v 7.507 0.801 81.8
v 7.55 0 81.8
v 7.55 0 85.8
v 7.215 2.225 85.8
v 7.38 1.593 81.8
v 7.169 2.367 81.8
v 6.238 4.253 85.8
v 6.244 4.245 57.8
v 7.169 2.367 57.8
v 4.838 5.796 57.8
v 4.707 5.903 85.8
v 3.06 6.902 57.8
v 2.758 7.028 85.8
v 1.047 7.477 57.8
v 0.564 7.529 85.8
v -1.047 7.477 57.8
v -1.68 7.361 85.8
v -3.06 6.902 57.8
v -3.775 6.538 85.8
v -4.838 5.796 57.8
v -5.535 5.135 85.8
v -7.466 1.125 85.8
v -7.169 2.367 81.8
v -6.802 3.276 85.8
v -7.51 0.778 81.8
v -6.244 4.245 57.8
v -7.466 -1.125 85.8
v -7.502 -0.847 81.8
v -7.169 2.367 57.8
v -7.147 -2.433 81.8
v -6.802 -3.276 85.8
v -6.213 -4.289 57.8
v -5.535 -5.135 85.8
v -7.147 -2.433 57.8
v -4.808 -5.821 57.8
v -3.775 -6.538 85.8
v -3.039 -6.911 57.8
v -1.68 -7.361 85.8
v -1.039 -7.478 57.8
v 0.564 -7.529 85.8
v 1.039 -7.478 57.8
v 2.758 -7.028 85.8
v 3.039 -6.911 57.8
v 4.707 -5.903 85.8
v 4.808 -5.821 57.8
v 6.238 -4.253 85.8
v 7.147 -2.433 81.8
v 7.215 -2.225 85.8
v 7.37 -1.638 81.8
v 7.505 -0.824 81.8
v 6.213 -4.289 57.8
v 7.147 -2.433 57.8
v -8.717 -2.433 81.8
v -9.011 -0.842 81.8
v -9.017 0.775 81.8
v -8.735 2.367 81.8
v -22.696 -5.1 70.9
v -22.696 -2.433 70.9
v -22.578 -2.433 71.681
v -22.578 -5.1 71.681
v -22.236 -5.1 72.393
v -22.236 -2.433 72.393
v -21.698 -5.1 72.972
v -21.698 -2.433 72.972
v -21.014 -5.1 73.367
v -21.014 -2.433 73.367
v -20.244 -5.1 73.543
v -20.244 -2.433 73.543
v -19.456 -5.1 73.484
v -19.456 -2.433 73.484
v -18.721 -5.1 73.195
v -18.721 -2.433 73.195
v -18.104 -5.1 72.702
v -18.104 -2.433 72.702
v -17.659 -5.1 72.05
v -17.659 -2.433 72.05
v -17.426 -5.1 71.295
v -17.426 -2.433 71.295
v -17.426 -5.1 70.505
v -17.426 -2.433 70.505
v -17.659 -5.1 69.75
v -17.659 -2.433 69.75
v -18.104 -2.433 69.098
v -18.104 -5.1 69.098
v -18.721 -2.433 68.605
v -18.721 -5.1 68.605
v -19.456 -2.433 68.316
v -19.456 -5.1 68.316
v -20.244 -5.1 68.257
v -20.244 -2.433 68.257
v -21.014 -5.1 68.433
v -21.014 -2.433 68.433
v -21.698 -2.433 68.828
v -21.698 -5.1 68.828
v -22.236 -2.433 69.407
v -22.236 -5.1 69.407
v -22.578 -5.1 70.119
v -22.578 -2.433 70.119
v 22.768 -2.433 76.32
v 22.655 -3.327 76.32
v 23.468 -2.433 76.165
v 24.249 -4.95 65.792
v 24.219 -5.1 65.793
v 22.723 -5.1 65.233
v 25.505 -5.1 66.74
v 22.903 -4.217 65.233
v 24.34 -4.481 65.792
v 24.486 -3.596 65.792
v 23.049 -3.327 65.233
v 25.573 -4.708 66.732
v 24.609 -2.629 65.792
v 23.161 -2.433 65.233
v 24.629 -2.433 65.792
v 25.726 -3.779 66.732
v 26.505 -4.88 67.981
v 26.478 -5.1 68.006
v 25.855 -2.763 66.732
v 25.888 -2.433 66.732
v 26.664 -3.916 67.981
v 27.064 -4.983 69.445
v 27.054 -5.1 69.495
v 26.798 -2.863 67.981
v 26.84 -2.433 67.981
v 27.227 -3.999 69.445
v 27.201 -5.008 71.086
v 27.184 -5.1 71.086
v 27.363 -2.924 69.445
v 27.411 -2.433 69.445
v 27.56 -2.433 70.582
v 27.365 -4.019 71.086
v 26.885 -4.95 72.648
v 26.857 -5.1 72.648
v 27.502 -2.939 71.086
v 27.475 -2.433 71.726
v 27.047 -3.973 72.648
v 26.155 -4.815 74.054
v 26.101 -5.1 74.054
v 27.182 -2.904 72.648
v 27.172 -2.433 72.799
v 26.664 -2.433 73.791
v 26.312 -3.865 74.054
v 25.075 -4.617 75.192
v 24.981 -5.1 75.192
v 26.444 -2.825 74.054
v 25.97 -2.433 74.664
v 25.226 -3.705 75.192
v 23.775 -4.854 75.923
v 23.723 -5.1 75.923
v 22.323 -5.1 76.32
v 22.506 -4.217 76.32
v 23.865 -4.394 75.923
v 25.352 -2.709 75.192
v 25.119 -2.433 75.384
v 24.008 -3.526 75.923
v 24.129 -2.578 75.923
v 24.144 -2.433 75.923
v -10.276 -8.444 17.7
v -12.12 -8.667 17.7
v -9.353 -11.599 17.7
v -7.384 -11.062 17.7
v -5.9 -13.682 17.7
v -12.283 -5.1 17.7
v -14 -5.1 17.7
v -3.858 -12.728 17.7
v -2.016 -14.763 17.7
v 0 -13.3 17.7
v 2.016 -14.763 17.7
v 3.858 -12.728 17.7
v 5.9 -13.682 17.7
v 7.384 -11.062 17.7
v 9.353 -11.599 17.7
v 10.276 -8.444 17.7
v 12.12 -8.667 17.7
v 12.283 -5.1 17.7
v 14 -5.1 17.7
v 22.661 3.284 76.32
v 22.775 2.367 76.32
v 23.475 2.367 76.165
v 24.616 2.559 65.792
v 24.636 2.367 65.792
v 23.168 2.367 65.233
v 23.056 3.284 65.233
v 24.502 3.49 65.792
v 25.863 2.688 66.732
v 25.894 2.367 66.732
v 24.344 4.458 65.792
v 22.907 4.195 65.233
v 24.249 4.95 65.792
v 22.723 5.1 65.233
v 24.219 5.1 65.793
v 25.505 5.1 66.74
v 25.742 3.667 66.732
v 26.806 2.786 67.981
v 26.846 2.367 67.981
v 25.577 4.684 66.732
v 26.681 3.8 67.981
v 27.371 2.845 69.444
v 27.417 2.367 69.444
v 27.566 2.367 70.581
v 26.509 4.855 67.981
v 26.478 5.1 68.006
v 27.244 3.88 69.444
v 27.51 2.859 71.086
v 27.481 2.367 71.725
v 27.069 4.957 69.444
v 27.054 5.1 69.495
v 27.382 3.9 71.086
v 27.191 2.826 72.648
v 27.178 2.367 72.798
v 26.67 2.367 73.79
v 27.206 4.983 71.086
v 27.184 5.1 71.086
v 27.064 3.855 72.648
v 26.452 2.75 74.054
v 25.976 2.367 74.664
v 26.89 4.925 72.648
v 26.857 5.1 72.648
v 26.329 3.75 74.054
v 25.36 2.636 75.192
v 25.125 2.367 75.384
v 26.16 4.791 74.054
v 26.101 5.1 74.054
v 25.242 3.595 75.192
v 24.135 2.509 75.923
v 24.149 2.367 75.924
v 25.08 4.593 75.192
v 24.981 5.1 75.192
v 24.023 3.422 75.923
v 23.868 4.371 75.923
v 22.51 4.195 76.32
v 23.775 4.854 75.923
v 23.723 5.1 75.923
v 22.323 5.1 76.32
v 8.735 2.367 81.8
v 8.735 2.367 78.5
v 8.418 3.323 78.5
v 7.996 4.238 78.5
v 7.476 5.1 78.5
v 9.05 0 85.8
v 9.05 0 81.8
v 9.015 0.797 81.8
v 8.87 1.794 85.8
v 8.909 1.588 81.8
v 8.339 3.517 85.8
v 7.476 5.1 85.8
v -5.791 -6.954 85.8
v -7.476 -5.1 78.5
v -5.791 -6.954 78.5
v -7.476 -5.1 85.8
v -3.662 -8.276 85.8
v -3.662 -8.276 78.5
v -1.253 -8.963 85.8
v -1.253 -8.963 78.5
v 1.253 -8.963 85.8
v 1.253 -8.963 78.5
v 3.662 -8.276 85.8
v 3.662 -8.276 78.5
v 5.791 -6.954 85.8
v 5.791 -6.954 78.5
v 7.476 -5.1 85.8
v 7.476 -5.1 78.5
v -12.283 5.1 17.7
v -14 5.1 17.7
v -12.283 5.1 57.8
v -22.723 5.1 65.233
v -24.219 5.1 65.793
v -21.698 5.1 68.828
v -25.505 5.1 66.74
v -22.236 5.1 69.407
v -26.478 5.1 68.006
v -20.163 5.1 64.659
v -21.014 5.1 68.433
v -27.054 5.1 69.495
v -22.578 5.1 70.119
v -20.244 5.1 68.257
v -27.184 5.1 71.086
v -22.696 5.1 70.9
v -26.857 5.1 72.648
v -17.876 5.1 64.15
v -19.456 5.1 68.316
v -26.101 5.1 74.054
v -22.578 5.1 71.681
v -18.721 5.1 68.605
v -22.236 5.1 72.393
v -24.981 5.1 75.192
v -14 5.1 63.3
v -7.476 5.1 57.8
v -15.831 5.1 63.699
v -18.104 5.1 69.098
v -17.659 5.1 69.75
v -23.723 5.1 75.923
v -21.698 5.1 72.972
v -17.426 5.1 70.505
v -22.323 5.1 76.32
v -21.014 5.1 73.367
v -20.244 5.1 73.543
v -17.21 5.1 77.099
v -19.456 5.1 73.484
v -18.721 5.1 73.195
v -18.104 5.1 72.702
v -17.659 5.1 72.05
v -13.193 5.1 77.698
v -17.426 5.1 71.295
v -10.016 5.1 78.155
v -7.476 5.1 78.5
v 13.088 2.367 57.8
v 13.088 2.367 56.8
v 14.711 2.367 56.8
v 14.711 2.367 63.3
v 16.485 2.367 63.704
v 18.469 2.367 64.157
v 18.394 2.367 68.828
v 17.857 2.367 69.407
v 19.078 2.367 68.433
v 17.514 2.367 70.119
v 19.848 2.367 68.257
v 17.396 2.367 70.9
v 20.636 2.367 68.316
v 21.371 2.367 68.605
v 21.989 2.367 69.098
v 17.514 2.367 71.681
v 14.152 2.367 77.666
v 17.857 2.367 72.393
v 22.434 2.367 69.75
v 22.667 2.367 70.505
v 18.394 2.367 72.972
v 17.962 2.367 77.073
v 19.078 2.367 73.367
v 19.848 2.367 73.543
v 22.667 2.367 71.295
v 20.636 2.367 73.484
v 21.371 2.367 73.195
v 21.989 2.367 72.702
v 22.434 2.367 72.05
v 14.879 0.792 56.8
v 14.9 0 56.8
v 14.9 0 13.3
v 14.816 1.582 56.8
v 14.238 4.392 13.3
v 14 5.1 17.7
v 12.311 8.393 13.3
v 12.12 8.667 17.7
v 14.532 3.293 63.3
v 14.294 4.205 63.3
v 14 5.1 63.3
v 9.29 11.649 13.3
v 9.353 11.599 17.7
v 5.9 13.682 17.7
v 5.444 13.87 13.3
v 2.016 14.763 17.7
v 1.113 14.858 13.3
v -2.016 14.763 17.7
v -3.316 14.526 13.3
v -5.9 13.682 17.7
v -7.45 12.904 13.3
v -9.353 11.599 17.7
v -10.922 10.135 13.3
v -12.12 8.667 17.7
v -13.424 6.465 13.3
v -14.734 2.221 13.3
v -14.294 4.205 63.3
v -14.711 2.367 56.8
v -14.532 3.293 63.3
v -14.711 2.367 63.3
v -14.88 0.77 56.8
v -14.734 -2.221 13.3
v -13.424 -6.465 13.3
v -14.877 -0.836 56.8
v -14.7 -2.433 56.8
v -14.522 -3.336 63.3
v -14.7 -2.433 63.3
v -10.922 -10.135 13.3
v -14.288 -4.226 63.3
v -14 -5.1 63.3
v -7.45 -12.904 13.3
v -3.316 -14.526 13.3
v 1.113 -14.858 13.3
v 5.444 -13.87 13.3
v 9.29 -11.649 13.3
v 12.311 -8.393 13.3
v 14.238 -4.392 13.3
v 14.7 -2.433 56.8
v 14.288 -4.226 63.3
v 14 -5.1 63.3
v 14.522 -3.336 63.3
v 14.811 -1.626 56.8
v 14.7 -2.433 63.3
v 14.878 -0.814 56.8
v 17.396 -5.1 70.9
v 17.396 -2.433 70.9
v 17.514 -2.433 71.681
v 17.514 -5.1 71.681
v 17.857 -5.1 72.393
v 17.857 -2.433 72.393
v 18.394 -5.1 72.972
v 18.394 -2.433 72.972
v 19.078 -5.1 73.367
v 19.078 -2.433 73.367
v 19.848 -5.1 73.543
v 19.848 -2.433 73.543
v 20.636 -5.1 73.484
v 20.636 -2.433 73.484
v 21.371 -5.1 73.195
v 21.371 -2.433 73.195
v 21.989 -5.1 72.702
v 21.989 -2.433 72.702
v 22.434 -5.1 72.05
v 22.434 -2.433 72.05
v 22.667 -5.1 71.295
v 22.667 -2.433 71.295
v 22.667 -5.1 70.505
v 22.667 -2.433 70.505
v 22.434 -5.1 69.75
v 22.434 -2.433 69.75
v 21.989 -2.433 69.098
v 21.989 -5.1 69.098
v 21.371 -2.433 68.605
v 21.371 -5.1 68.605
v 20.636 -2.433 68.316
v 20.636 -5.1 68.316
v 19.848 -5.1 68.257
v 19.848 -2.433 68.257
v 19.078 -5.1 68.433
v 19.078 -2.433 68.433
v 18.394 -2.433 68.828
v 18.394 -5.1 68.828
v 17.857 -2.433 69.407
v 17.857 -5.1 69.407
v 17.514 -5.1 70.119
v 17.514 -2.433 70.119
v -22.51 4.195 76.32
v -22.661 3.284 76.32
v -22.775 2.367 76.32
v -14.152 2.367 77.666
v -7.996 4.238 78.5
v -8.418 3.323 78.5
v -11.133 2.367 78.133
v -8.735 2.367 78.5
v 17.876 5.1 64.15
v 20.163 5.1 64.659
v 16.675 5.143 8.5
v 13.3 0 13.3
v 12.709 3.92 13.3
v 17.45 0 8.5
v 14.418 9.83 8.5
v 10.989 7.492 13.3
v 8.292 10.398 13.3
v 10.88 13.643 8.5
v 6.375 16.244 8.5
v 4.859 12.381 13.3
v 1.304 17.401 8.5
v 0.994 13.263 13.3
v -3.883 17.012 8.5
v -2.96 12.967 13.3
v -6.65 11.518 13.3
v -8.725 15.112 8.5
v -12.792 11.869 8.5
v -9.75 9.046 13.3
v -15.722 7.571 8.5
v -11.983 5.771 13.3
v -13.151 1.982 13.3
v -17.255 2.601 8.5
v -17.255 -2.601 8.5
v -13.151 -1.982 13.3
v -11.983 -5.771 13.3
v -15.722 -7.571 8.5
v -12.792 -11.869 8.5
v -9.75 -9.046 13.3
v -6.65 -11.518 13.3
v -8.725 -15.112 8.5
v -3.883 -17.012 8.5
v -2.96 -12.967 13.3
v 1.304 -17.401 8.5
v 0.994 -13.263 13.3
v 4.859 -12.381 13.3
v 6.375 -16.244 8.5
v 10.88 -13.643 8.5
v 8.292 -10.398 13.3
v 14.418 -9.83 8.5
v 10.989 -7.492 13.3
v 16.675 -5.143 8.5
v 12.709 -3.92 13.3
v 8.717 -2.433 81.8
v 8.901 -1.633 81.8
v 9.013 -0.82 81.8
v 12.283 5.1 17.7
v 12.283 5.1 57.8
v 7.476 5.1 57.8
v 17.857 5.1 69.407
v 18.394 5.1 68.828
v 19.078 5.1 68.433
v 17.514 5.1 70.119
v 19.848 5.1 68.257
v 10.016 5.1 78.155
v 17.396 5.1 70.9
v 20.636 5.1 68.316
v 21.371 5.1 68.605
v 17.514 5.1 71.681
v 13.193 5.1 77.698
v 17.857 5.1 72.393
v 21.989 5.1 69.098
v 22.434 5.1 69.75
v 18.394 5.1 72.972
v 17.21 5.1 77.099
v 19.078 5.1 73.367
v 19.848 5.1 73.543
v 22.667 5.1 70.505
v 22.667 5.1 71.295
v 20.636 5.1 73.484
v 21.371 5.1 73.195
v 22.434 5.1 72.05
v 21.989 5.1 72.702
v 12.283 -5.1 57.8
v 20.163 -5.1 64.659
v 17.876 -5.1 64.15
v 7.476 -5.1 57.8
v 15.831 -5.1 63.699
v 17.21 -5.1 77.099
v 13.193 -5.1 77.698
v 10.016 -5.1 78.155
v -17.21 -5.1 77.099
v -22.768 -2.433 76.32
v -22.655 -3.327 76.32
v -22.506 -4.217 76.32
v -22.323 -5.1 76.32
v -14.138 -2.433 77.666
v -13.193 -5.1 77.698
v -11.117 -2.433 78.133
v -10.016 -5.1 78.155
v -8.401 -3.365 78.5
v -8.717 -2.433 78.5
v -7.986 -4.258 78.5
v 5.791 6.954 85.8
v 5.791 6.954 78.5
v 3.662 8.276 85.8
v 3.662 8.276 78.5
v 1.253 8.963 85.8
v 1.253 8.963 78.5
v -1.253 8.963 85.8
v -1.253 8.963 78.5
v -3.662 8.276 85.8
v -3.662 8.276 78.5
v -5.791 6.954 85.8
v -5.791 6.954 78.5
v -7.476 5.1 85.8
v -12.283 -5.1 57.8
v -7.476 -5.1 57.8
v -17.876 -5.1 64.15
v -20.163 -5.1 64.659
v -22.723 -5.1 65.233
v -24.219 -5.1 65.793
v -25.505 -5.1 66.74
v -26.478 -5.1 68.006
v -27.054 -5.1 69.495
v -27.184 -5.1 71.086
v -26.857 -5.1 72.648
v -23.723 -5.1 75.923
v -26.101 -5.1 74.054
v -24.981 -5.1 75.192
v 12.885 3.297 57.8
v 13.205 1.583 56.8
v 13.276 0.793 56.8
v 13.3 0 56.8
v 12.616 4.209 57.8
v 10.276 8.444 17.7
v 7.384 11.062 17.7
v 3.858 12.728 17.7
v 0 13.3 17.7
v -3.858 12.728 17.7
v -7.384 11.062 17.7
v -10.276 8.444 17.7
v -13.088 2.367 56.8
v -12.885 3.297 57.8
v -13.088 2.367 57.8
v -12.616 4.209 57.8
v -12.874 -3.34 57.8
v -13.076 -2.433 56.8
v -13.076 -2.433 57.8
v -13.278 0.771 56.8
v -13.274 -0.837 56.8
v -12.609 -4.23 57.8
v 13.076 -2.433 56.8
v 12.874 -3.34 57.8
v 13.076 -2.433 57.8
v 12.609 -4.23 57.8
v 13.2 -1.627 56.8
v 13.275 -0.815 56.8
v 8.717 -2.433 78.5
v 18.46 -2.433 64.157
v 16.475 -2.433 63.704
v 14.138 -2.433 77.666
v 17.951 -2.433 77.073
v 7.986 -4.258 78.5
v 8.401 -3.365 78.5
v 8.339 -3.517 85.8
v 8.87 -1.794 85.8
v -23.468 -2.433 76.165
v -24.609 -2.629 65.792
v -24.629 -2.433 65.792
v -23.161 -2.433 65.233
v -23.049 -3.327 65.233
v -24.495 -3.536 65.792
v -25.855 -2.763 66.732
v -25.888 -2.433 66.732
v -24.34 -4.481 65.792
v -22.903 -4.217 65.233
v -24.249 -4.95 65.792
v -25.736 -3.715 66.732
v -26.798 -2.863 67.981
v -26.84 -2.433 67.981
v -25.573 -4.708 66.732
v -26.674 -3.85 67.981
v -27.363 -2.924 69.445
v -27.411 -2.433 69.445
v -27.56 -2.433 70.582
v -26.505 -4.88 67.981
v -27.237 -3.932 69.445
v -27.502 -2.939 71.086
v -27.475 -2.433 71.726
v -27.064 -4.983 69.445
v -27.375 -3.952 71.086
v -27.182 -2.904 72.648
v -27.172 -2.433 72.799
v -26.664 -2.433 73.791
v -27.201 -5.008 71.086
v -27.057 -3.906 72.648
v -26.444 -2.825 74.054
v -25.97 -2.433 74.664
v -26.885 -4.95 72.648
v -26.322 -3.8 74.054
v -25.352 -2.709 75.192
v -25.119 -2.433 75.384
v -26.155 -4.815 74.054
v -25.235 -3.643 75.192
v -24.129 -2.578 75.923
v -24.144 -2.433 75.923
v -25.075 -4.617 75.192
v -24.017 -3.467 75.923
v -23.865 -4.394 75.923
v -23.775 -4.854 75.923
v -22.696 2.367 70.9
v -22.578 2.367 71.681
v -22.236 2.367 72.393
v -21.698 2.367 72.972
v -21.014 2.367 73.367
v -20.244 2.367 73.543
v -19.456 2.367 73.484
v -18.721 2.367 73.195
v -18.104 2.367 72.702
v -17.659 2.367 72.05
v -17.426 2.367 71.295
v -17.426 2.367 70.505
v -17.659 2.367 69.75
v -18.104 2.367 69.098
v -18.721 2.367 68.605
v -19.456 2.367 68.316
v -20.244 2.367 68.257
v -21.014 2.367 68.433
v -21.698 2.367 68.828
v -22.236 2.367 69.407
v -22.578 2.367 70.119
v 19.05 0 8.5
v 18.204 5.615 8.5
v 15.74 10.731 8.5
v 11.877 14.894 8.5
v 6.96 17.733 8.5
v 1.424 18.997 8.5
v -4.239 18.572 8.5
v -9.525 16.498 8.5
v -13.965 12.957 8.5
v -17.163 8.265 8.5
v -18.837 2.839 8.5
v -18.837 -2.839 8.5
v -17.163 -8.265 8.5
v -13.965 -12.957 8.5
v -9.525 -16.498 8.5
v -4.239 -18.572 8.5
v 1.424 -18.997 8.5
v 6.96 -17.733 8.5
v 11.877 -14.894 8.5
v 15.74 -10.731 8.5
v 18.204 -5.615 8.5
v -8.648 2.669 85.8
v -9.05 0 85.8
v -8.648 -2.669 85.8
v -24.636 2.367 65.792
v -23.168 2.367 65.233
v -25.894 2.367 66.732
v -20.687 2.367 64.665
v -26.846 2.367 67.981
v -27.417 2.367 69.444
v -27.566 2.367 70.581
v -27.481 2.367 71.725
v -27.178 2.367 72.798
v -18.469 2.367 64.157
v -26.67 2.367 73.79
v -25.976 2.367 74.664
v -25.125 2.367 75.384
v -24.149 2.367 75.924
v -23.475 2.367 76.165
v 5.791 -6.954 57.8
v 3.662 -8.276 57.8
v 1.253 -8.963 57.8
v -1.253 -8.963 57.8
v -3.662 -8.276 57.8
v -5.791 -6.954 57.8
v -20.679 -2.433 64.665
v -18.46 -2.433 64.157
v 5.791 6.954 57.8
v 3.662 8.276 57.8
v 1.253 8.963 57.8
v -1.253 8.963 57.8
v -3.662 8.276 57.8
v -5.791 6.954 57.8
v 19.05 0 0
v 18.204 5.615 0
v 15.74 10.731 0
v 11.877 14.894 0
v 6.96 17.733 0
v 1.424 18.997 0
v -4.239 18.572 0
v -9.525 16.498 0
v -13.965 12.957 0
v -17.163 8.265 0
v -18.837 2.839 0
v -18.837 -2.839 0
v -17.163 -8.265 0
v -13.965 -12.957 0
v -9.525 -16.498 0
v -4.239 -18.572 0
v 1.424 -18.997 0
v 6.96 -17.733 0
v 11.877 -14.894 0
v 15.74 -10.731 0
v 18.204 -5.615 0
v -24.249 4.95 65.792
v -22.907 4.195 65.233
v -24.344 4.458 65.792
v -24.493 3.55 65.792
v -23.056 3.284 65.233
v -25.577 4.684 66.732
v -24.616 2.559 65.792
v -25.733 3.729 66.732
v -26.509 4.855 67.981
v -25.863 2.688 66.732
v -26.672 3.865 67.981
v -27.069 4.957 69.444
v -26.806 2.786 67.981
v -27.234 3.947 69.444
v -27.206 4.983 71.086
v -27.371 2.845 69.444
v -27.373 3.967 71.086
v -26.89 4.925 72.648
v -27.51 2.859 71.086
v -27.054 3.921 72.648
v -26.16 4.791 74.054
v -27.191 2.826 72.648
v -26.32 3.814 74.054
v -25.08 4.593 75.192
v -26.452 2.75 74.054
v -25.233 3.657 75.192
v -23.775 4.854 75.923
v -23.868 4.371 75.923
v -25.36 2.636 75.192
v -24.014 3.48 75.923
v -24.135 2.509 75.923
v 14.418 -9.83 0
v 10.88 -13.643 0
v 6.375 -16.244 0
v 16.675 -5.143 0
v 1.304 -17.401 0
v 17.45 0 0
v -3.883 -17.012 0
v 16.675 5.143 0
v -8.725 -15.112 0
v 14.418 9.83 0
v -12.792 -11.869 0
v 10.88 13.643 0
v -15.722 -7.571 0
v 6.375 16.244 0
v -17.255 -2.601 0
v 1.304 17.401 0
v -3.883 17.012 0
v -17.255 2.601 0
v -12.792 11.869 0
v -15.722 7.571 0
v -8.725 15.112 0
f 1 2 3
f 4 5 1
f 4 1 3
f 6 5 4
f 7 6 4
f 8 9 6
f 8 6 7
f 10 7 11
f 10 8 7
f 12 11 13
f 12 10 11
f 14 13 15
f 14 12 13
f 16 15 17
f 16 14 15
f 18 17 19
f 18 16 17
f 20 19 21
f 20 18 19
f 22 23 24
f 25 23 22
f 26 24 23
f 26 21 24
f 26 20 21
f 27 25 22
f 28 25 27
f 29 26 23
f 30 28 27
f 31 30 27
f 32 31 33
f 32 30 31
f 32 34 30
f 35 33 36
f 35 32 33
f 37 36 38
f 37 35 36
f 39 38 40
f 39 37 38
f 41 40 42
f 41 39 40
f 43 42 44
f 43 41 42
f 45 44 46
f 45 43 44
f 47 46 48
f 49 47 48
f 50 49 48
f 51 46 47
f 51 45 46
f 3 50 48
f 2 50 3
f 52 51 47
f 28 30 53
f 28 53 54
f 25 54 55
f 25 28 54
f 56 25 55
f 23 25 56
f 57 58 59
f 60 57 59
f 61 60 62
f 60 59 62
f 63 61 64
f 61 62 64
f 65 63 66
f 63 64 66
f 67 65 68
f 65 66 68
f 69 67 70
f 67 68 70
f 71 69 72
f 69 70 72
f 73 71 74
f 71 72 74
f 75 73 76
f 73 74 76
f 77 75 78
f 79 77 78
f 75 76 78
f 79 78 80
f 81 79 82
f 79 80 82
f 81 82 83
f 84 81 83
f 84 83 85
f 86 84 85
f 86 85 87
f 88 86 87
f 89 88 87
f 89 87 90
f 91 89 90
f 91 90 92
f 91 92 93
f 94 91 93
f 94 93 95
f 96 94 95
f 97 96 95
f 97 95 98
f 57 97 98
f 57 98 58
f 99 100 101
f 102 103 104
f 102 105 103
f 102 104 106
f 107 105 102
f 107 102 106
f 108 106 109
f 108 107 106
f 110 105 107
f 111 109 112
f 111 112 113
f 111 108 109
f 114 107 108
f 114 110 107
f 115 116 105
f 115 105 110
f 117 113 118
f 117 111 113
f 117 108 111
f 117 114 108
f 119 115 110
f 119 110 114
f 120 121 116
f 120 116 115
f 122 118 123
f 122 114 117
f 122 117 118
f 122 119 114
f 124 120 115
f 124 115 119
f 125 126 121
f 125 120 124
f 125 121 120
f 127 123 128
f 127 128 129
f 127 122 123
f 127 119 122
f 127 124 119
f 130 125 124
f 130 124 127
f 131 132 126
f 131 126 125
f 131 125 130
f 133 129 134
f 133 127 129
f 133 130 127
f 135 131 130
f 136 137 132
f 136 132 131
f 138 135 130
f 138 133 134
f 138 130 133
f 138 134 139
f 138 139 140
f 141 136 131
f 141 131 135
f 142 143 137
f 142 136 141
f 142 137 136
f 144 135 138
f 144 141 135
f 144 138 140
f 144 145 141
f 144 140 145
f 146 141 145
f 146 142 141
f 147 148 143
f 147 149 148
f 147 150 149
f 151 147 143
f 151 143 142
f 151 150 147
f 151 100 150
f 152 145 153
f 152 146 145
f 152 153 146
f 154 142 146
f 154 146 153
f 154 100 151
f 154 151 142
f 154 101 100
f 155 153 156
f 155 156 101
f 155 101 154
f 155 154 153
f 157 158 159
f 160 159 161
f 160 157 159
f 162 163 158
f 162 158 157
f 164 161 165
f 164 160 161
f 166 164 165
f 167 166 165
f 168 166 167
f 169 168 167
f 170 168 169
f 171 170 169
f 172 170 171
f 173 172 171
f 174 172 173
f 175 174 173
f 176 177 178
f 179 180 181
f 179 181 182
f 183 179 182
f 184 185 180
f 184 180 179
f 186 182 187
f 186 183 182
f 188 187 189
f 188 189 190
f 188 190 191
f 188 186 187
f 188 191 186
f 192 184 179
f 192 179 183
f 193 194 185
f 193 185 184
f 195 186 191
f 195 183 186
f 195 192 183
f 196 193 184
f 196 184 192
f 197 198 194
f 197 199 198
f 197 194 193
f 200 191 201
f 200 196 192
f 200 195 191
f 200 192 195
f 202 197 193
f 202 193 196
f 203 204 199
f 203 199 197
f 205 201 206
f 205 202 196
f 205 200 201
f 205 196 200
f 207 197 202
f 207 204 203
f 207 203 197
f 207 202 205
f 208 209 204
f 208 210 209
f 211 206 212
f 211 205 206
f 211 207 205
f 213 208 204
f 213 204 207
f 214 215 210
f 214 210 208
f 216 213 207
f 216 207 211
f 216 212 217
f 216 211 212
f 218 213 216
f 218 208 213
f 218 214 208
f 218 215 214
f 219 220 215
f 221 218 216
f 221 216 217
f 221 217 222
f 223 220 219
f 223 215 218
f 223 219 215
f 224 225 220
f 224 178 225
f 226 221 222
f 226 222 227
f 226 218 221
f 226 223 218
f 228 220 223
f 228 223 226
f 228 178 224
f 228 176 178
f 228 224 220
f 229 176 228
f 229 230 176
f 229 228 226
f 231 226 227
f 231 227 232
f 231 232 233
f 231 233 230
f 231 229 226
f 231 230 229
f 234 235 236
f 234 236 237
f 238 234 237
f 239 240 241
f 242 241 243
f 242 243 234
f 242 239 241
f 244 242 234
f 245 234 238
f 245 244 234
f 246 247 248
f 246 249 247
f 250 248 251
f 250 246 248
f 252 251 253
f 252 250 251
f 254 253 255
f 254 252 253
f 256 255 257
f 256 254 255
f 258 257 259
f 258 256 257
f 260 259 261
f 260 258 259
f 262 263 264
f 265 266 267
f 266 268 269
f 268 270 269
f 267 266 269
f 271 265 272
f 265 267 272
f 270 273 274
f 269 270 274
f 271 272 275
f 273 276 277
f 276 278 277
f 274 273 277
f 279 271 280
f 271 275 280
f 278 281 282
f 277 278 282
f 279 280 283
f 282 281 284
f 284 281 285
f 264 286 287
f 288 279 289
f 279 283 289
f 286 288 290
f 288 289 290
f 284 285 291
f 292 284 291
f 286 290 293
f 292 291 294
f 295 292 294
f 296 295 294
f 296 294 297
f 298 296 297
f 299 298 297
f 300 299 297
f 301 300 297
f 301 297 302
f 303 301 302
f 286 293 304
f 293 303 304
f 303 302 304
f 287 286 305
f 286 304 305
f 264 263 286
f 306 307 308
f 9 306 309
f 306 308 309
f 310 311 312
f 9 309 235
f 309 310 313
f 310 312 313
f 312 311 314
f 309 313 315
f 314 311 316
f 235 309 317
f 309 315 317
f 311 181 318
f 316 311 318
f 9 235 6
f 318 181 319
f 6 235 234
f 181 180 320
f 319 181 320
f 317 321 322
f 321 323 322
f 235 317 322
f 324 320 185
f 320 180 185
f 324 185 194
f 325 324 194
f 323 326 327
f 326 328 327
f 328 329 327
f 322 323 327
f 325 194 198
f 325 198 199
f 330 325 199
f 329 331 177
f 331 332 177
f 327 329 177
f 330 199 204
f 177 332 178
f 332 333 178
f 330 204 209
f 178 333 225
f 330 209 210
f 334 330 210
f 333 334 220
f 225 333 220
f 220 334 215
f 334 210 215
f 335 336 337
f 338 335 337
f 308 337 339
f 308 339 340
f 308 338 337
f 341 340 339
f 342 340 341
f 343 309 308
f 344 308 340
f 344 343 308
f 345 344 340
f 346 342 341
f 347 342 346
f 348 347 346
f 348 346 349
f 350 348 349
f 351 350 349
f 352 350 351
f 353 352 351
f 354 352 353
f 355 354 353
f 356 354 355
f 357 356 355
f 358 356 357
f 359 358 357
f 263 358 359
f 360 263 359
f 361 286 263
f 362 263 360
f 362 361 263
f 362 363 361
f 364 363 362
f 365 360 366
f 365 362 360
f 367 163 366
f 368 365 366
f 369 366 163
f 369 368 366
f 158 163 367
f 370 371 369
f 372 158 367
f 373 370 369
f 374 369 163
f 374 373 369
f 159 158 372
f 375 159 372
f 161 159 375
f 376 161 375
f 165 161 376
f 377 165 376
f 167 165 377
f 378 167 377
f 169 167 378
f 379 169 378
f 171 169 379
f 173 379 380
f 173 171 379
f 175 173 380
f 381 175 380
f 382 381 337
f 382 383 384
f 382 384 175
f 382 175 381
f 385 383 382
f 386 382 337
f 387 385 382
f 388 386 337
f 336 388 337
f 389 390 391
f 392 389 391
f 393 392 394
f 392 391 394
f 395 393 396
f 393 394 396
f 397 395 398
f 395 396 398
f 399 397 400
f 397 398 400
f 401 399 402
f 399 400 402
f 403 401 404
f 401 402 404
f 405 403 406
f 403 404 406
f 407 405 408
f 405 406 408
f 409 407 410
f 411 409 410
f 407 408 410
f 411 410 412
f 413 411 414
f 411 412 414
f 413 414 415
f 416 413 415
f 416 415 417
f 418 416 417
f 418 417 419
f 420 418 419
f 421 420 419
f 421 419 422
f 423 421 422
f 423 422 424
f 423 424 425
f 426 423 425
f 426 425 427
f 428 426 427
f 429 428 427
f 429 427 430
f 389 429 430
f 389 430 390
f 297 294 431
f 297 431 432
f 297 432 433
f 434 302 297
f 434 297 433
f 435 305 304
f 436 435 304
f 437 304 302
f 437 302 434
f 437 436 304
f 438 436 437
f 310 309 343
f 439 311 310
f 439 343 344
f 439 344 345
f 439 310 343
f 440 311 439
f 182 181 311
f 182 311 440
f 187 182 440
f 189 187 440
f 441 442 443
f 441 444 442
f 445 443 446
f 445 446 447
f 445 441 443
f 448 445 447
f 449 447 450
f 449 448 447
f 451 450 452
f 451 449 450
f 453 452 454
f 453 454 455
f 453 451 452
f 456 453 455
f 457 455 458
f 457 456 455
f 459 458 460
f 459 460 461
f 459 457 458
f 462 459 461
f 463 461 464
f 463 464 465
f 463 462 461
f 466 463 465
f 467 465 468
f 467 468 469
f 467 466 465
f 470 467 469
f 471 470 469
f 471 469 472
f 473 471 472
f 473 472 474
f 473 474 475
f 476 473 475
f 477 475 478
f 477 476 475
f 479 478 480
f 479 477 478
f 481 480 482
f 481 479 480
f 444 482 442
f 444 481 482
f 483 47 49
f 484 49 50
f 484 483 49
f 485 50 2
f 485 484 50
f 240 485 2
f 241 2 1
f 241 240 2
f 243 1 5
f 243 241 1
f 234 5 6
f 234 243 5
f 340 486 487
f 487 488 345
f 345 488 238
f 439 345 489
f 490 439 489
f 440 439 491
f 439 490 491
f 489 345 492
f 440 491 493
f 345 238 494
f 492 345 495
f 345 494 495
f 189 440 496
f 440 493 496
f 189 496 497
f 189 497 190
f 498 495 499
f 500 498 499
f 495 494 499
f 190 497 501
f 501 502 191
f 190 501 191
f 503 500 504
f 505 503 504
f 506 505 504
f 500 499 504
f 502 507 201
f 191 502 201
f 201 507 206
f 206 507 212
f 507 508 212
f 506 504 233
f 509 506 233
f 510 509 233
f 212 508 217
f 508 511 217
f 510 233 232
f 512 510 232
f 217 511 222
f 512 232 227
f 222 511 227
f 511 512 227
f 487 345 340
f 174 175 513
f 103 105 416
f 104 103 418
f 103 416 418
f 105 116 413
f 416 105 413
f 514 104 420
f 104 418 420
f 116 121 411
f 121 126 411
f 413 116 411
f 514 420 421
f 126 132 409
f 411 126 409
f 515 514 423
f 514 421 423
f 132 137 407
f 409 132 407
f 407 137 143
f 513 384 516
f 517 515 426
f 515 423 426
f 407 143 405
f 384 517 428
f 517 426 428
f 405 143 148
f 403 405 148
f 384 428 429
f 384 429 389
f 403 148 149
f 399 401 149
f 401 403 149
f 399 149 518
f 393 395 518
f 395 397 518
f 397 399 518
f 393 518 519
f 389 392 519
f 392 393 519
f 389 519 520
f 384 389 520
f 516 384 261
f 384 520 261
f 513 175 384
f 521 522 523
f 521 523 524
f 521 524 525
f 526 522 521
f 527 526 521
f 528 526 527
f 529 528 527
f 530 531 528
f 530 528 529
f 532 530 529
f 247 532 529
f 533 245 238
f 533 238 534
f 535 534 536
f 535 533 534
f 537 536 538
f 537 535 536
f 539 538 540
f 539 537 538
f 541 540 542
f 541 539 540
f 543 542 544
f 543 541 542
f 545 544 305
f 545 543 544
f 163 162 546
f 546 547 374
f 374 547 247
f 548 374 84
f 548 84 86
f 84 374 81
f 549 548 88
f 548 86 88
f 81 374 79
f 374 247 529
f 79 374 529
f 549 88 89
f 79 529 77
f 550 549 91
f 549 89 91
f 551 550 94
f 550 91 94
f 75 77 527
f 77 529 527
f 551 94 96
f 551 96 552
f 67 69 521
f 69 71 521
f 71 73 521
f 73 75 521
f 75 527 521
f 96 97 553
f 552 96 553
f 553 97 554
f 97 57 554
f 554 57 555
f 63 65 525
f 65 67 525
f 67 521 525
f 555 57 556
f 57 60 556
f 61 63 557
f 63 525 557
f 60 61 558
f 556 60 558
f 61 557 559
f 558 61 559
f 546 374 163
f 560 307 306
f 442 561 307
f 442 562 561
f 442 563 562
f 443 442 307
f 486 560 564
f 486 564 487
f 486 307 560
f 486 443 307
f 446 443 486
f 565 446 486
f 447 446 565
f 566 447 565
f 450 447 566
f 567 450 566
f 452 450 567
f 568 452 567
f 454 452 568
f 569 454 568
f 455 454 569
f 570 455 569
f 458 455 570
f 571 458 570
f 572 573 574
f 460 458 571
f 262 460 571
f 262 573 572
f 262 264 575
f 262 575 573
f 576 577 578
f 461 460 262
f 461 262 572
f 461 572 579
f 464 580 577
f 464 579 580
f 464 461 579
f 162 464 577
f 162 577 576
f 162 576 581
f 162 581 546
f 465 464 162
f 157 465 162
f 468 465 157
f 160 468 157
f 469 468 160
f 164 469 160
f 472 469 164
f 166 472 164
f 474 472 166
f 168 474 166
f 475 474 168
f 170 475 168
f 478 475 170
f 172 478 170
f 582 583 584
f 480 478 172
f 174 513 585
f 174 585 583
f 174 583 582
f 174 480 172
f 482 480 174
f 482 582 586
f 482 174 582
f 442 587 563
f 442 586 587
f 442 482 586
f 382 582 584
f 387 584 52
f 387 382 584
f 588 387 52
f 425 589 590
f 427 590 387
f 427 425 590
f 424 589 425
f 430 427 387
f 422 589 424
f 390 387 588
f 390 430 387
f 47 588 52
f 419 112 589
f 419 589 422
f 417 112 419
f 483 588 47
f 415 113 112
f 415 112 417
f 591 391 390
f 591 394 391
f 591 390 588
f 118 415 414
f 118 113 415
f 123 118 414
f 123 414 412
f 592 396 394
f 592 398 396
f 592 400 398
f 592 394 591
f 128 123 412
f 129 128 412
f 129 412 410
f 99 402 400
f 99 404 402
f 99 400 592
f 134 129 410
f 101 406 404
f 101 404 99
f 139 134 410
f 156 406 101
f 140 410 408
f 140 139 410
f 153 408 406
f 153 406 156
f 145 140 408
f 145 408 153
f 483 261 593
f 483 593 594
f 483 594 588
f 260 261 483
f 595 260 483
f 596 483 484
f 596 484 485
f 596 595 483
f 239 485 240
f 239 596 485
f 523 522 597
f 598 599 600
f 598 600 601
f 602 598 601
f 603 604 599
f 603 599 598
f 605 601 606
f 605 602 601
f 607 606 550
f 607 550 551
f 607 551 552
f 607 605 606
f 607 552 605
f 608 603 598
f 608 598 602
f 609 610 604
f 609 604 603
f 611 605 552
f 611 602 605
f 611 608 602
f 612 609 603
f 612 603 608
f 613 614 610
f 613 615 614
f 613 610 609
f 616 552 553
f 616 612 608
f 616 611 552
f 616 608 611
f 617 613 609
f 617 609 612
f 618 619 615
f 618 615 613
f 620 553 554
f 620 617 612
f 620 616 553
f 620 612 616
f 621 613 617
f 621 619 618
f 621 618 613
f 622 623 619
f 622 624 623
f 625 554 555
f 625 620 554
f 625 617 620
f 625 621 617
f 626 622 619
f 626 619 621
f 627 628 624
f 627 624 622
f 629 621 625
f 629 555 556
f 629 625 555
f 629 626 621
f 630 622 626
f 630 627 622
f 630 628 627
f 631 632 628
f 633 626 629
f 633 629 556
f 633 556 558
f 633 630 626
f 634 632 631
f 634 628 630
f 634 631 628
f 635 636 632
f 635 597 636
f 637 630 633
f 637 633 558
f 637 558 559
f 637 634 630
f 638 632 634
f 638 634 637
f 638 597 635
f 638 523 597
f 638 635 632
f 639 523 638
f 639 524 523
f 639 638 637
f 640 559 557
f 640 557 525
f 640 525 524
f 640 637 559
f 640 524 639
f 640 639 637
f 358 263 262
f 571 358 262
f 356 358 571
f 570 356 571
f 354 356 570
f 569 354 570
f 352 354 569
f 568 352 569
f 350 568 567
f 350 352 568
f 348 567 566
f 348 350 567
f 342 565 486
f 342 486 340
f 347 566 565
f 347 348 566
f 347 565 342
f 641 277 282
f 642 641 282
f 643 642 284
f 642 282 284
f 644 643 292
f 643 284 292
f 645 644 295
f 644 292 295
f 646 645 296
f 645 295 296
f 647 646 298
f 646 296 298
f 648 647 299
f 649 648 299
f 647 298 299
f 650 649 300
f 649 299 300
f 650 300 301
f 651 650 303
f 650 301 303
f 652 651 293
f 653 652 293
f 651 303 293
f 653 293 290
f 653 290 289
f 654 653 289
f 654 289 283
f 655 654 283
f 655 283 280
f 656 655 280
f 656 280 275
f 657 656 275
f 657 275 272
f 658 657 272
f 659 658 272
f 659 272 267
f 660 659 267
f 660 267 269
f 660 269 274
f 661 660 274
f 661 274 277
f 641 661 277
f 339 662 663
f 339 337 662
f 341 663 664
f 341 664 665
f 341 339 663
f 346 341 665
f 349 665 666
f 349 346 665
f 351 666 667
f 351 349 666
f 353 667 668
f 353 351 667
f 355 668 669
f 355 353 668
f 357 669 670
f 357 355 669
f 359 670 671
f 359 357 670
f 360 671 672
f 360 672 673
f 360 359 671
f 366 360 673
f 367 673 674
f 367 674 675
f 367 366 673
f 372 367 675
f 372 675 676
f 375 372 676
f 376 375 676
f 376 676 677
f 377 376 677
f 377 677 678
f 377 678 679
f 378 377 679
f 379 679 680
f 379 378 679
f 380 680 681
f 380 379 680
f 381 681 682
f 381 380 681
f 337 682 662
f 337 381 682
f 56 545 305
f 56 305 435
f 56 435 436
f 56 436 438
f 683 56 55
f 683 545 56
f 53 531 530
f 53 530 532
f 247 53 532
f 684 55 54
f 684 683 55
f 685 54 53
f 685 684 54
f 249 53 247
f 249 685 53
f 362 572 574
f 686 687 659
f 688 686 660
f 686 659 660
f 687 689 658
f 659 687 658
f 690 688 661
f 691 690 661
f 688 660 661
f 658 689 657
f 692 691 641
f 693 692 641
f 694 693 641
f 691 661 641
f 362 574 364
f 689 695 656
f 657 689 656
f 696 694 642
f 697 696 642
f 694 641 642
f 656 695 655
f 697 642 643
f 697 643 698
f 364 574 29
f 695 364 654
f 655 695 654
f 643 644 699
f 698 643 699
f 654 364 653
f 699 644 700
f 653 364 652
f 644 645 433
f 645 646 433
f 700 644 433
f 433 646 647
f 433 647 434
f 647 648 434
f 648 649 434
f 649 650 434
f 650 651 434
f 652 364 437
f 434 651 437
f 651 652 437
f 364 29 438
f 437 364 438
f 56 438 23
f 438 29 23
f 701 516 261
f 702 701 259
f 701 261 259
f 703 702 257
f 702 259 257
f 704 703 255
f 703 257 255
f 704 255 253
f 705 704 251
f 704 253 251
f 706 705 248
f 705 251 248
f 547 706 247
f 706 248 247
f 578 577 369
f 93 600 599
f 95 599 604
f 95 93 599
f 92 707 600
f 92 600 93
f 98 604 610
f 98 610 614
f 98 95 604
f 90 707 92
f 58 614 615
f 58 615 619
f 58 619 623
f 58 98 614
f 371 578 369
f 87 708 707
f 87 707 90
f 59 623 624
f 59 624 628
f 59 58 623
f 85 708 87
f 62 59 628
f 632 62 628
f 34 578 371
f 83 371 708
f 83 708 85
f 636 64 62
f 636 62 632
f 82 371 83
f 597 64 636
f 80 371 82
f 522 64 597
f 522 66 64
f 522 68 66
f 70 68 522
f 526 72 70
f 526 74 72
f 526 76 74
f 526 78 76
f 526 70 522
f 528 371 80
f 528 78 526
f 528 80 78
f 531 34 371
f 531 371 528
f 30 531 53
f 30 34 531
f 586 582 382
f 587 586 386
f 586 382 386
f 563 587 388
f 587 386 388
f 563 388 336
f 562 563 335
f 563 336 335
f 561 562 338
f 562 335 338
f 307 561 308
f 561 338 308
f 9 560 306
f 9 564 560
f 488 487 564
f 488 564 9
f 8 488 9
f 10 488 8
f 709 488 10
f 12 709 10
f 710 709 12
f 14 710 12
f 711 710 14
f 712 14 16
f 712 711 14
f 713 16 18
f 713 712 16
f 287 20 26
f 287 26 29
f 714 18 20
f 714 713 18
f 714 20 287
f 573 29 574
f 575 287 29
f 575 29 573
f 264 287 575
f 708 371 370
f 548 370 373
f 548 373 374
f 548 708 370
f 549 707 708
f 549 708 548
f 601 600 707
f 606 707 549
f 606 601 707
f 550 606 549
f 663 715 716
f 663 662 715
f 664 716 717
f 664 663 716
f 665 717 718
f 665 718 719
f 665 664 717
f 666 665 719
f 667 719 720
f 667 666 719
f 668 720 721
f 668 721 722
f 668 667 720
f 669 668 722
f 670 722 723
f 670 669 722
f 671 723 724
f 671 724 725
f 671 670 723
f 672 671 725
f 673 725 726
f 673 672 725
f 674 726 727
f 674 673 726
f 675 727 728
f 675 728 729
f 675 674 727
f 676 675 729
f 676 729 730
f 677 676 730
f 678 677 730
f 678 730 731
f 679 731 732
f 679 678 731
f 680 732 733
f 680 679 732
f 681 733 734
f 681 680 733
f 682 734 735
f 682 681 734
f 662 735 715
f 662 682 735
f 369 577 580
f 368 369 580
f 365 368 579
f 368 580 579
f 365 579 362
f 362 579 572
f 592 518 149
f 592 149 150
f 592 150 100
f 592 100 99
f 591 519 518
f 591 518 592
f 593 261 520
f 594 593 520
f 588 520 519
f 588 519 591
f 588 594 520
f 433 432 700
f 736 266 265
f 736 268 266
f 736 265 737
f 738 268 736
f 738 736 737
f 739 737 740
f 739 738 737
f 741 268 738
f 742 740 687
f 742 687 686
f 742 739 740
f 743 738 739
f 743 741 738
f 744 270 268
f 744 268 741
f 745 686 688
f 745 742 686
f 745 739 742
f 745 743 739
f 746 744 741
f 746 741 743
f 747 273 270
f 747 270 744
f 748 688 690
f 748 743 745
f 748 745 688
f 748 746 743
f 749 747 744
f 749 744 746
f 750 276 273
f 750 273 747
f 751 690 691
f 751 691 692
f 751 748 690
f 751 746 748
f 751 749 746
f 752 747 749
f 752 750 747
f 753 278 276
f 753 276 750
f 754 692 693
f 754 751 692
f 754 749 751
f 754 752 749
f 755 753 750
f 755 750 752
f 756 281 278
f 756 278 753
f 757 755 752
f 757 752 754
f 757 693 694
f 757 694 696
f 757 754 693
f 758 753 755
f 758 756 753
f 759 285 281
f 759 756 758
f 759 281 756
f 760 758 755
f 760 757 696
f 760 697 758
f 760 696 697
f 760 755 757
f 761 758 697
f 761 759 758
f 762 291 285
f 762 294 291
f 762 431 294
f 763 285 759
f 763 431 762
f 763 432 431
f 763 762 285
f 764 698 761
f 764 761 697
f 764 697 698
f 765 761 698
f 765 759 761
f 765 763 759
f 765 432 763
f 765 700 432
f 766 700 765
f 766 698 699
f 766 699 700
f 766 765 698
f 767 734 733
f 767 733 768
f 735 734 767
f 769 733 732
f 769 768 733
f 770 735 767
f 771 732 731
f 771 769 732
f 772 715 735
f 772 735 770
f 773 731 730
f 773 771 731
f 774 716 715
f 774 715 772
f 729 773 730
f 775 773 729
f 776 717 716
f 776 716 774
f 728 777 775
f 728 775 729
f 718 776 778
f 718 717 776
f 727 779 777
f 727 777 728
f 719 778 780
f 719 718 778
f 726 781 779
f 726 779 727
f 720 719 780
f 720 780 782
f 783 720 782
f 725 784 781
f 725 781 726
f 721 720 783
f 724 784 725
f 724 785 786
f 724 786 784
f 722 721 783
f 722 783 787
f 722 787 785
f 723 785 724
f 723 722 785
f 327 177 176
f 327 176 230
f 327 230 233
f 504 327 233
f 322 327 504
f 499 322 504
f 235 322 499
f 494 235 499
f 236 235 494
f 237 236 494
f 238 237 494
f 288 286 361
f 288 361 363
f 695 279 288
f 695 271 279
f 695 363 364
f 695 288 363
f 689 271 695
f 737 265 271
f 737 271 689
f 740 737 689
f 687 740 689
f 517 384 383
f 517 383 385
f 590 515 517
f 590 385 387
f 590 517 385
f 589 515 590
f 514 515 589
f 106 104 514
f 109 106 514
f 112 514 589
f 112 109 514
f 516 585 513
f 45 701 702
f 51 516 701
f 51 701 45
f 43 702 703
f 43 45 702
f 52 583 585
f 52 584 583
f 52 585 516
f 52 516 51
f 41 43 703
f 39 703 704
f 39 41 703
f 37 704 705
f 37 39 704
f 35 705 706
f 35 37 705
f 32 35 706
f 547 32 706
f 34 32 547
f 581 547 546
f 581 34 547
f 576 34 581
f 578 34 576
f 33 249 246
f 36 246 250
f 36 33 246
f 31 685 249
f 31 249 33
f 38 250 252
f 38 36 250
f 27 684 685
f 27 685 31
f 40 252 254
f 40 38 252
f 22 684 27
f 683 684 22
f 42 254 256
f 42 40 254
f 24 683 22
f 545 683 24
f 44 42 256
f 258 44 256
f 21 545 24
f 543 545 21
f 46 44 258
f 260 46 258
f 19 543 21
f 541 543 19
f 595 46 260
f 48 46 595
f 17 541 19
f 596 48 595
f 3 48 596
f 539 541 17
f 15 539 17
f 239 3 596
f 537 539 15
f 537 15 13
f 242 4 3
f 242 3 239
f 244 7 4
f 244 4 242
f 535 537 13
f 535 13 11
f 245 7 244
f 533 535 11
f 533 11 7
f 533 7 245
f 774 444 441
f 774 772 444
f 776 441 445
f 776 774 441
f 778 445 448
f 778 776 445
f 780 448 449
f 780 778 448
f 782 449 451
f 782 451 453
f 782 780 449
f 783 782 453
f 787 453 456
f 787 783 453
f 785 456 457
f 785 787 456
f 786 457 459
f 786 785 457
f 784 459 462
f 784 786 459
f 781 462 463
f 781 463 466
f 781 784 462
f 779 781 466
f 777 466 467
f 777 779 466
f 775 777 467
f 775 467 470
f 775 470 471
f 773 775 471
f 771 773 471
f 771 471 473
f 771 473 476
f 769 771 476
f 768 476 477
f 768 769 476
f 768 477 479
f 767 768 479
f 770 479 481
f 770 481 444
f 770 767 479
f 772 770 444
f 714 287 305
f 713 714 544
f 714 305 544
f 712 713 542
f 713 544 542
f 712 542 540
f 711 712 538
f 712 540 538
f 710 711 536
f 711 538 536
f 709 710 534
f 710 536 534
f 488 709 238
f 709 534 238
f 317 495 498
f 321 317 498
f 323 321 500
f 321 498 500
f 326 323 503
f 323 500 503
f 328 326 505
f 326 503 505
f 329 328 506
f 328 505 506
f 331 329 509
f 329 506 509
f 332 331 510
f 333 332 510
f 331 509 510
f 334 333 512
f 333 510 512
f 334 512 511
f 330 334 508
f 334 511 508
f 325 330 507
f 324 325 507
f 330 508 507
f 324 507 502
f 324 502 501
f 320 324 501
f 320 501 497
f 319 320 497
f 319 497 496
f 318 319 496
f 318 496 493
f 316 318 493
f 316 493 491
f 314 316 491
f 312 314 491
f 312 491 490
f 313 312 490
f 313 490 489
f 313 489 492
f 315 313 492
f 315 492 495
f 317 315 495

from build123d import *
from build123d import SkipClean  # not in build123d's __all__

# Parameters (mm, degrees)
F3_DEPTH = 68.1
F4_W     = 4.8
F4_H     = 25
F5_DEPTH = 41.80857
F6_R     = 2.65
F7_DEPTH = 25


with BuildPart() as f1:
    # F0 (on Front) → F1 (revolve)
    with BuildSketch(Plane.XZ):
        with BuildLine():
            Line((17.45, 8.5), (17.45, 0))
            Line((17.45, 0), (19.05, 0))
            Line((19.05, 0), (19.05, 8.5))
            Line((19.05, 8.5), (14.9, 13.3))
            Line((14.9, 13.3), (14.9, 63.3))
            Line((14.9, 63.3), (23.2882495839, 65.2334026039))
            ThreePointArc((23.2882495839, 65.2334026039), (27.6657550526, 70.9379230726), (22.8977616622, 76.3203339576))
            Line((22.8977616622, 76.3203339576), (9.05, 78.5))
            Line((9.05, 78.5), (9.05, 85.8))
            Line((9.05, 85.8), (7.55, 85.8))
            Line((7.55, 85.8), (7.55, 57.8))
            Line((7.55, 57.8), (13.3, 57.8))
            Line((13.3, 57.8), (13.3, 13.3))
            Line((13.3, 13.3), (17.45, 8.5))
        make_face()
    revolve(axis=Axis((0, 0, 43.5625389218), (0, 0, 1)))

    # F2 (on face) → F3 (cut)
    with BuildSketch(Plane.XY.offset(85.8)):
        with BuildLine():
            ThreePointArc((7.4761286773, -5.1), (0, -9.05), (-7.4761286773, -5.1))
            Line((-7.4761286773, -5.1), (-33.3200879395, -5.1))
            Line((-33.3200879395, -5.1), (-33.3200879395, -32.3637121379))
            Line((-33.3200879395, -32.3637121379), (33.8455328711, -32.3637121379))
            Line((33.8455328711, -32.3637121379), (33.8455328711, -5.1))
            Line((33.8455328711, -5.1), (7.4761286773, -5.1))
        make_face()
        with BuildLine():
            Line((7.4761286773, 5.1), (33.8455328711, 5.1))
            Line((33.8455328711, 5.1), (33.8455328711, 32.3637121379))
            Line((33.8455328711, 32.3637121379), (-33.3200879395, 32.3637121379))
            Line((-33.3200879395, 32.3637121379), (-33.3200879395, 5.1))
            Line((-33.3200879395, 5.1), (-7.4761286773, 5.1))
            ThreePointArc((-7.4761286773, 5.1), (0, 9.05), (7.4761286773, 5.1))
        make_face()
    with SkipClean():  # cleaning this boolean's faces spoils the solid; the shape is the same uncleaned
        extrude(amount=-F3_DEPTH, mode=Mode.SUBTRACT)

    # F4 (on Right) → F5 (cut, symmetric)
    with BuildSketch(Plane.YZ):
        with Locations((-0.0327096786, 69.3)):
            Rectangle(F4_W, F4_H)
    extrude(amount=F5_DEPTH, both=True, mode=Mode.SUBTRACT)

    # F6 (on face) → F7 (cut)
    with BuildSketch(Plane(origin=(0, 5.1, 0), x_dir=(-1, 0, 0), z_dir=(0, 1, 0))):
        with Locations((-20.0461286773, 70.9)):
            Circle(F6_R)
        with Locations((20.0461286773, 70.9)):
            Circle(F6_R)
    extrude(amount=-F7_DEPTH, mode=Mode.SUBTRACT)


solid = f1.part
